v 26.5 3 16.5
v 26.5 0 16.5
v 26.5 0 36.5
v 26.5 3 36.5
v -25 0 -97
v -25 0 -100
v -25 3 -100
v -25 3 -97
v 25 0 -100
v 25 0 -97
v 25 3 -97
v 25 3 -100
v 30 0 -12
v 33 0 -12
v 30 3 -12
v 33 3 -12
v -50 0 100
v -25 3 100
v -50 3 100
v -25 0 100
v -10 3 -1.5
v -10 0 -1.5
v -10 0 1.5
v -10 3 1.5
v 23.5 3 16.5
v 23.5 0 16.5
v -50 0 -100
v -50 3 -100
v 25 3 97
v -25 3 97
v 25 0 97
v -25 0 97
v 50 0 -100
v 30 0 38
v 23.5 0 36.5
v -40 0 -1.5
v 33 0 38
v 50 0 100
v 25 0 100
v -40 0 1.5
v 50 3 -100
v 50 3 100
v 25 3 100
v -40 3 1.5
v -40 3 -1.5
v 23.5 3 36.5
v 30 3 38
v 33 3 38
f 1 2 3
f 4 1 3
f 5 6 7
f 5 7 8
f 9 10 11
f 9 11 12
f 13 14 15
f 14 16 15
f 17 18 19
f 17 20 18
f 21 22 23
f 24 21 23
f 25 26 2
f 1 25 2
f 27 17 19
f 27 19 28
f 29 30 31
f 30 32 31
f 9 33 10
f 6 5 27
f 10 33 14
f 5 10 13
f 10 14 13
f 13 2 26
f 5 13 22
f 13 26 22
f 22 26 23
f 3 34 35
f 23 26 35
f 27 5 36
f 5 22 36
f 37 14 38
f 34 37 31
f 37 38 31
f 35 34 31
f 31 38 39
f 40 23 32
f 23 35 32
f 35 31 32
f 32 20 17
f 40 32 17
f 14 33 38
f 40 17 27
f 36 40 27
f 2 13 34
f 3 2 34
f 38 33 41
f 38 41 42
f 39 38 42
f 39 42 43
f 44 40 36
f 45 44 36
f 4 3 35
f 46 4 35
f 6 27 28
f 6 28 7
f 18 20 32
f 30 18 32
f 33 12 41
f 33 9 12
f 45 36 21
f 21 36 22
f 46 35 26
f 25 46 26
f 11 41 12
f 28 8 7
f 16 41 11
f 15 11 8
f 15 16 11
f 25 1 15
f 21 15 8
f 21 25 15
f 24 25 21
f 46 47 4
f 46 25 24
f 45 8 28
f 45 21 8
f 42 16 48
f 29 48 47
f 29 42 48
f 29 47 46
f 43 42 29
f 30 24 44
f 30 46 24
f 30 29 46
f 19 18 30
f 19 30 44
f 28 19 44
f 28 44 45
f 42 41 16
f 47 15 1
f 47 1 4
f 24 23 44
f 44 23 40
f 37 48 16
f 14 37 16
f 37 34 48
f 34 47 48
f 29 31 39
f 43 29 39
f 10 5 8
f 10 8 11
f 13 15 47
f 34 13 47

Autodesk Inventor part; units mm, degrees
ref_plane "YZ Plane" through (0, 0, 0) normal (1, 0, 0) x (0, 1, 0)
ref_plane "XZ Plane" through (0, 0, 0) normal (0, 1, 0) x (-1, 0, 0)
ref_plane "XY Plane" through (0, 0, 0) normal (0, 0, 1) x (1, 0, 0)
sketch "Boceto1" plane through (0, 0, 0) normal (0, 1, 0) x (-1, 0, 0)
  line L0 (50, 100) -> (50, -100)
  line L1 (-50, 100) -> (50, -100) construction
  line L2 (50, 100) -> (-50, -100) construction
  line L3 (25, 100) -> (25, 97)
  line L4 (25, 97) -> (-25, 97)
  line L5 (-25, 97) -> (-25, 100)
  line L6 (-50, 100) -> (-25, 100)
  line L7 (25, 100) -> (50, 100)
  line L8 (25, -100) -> (25, -97)
  line L9 (25, -97) -> (-25, -97)
  line L10 (-25, -97) -> (-25, -100)
  line L11 (50, -100) -> (25, -100)
  line L12 (-25, -100) -> (-50, -100)
  line L13 (-50, -100) -> (-50, 100)
  point P0 (0, 0)
  dimension "d0" = 100
  dimension "d1" = 200
  dimension "d4" = 3
  dimension "d5" = 50
  dimension "d7" = 3
  dimension "d8" = 50
  dimension "d12" = 25
extrude "Extrusión1" add sketch "Boceto1" along normal blind 3
sketch "Boceto2" plane through (0, 3, 0) normal (0, 1, 0) x (1, 0, 0)
  line L0 (33, 12) -> (30, 12)
  line L1 (30, 12) -> (30, -38)
  line L2 (30, -38) -> (33, -38)
  line L3 (33, -38) -> (33, 12)
  line L4 (50, 100) -> (25, 100) projected
  line L5 (-50, 100) -> (-50, -100) projected
  point P0 (0, 0)
  dimension "d17" = 3
  dimension "d18" = 50
  dimension "d19" = 88
  dimension "d20" = 80
extrude "Extrusión2" cut sketch "Boceto2" against normal blind 3
sketch "Boceto3" plane through (0, 0, 0) normal (0, -1, 0) x (1, 0, 0)
  line L0 (-40, -1.5) -> (-10, -1.5)
  line L1 (-10, -1.5) -> (-10, 1.5)
  line L2 (-10, 1.5) -> (-40, 1.5)
  line L3 (-40, 1.5) -> (-40, -1.5)
  line L4 (-50, -100) -> (-25, -100) projected
  line L5 (30, -12) -> (30, 38) projected
  point P0 (0, 0)
  dimension "d23" = 30
  dimension "d24" = 3
  dimension "d25" = 98.5
  dimension "d26" = 40
extrude "Extrusión3" cut sketch "Boceto3" against normal blind 3
sketch "Boceto4" plane through (0, 0, 0) normal (0, -1, 0) x (1, 0, 0)
  line L0 (23.5, 16.5) -> (26.5, 16.5)
  line L1 (26.5, 16.5) -> (26.5, 36.5)
  line L2 (26.5, 36.5) -> (23.5, 36.5)
  line L3 (23.5, 36.5) -> (23.5, 16.5)
  line L4 (-40, 1.5) -> (-10, 1.5) projected
  line L5 (30, -12) -> (30, 38) projected
  point P0 (0, 0)
  dimension "d29" = 3
  dimension "d30" = 20
  dimension "d31" = 15
  dimension "d32" = 3.5
extrude "Extrusión4" cut sketch "Boceto4" against normal blind 3
properties part number "Piso"
